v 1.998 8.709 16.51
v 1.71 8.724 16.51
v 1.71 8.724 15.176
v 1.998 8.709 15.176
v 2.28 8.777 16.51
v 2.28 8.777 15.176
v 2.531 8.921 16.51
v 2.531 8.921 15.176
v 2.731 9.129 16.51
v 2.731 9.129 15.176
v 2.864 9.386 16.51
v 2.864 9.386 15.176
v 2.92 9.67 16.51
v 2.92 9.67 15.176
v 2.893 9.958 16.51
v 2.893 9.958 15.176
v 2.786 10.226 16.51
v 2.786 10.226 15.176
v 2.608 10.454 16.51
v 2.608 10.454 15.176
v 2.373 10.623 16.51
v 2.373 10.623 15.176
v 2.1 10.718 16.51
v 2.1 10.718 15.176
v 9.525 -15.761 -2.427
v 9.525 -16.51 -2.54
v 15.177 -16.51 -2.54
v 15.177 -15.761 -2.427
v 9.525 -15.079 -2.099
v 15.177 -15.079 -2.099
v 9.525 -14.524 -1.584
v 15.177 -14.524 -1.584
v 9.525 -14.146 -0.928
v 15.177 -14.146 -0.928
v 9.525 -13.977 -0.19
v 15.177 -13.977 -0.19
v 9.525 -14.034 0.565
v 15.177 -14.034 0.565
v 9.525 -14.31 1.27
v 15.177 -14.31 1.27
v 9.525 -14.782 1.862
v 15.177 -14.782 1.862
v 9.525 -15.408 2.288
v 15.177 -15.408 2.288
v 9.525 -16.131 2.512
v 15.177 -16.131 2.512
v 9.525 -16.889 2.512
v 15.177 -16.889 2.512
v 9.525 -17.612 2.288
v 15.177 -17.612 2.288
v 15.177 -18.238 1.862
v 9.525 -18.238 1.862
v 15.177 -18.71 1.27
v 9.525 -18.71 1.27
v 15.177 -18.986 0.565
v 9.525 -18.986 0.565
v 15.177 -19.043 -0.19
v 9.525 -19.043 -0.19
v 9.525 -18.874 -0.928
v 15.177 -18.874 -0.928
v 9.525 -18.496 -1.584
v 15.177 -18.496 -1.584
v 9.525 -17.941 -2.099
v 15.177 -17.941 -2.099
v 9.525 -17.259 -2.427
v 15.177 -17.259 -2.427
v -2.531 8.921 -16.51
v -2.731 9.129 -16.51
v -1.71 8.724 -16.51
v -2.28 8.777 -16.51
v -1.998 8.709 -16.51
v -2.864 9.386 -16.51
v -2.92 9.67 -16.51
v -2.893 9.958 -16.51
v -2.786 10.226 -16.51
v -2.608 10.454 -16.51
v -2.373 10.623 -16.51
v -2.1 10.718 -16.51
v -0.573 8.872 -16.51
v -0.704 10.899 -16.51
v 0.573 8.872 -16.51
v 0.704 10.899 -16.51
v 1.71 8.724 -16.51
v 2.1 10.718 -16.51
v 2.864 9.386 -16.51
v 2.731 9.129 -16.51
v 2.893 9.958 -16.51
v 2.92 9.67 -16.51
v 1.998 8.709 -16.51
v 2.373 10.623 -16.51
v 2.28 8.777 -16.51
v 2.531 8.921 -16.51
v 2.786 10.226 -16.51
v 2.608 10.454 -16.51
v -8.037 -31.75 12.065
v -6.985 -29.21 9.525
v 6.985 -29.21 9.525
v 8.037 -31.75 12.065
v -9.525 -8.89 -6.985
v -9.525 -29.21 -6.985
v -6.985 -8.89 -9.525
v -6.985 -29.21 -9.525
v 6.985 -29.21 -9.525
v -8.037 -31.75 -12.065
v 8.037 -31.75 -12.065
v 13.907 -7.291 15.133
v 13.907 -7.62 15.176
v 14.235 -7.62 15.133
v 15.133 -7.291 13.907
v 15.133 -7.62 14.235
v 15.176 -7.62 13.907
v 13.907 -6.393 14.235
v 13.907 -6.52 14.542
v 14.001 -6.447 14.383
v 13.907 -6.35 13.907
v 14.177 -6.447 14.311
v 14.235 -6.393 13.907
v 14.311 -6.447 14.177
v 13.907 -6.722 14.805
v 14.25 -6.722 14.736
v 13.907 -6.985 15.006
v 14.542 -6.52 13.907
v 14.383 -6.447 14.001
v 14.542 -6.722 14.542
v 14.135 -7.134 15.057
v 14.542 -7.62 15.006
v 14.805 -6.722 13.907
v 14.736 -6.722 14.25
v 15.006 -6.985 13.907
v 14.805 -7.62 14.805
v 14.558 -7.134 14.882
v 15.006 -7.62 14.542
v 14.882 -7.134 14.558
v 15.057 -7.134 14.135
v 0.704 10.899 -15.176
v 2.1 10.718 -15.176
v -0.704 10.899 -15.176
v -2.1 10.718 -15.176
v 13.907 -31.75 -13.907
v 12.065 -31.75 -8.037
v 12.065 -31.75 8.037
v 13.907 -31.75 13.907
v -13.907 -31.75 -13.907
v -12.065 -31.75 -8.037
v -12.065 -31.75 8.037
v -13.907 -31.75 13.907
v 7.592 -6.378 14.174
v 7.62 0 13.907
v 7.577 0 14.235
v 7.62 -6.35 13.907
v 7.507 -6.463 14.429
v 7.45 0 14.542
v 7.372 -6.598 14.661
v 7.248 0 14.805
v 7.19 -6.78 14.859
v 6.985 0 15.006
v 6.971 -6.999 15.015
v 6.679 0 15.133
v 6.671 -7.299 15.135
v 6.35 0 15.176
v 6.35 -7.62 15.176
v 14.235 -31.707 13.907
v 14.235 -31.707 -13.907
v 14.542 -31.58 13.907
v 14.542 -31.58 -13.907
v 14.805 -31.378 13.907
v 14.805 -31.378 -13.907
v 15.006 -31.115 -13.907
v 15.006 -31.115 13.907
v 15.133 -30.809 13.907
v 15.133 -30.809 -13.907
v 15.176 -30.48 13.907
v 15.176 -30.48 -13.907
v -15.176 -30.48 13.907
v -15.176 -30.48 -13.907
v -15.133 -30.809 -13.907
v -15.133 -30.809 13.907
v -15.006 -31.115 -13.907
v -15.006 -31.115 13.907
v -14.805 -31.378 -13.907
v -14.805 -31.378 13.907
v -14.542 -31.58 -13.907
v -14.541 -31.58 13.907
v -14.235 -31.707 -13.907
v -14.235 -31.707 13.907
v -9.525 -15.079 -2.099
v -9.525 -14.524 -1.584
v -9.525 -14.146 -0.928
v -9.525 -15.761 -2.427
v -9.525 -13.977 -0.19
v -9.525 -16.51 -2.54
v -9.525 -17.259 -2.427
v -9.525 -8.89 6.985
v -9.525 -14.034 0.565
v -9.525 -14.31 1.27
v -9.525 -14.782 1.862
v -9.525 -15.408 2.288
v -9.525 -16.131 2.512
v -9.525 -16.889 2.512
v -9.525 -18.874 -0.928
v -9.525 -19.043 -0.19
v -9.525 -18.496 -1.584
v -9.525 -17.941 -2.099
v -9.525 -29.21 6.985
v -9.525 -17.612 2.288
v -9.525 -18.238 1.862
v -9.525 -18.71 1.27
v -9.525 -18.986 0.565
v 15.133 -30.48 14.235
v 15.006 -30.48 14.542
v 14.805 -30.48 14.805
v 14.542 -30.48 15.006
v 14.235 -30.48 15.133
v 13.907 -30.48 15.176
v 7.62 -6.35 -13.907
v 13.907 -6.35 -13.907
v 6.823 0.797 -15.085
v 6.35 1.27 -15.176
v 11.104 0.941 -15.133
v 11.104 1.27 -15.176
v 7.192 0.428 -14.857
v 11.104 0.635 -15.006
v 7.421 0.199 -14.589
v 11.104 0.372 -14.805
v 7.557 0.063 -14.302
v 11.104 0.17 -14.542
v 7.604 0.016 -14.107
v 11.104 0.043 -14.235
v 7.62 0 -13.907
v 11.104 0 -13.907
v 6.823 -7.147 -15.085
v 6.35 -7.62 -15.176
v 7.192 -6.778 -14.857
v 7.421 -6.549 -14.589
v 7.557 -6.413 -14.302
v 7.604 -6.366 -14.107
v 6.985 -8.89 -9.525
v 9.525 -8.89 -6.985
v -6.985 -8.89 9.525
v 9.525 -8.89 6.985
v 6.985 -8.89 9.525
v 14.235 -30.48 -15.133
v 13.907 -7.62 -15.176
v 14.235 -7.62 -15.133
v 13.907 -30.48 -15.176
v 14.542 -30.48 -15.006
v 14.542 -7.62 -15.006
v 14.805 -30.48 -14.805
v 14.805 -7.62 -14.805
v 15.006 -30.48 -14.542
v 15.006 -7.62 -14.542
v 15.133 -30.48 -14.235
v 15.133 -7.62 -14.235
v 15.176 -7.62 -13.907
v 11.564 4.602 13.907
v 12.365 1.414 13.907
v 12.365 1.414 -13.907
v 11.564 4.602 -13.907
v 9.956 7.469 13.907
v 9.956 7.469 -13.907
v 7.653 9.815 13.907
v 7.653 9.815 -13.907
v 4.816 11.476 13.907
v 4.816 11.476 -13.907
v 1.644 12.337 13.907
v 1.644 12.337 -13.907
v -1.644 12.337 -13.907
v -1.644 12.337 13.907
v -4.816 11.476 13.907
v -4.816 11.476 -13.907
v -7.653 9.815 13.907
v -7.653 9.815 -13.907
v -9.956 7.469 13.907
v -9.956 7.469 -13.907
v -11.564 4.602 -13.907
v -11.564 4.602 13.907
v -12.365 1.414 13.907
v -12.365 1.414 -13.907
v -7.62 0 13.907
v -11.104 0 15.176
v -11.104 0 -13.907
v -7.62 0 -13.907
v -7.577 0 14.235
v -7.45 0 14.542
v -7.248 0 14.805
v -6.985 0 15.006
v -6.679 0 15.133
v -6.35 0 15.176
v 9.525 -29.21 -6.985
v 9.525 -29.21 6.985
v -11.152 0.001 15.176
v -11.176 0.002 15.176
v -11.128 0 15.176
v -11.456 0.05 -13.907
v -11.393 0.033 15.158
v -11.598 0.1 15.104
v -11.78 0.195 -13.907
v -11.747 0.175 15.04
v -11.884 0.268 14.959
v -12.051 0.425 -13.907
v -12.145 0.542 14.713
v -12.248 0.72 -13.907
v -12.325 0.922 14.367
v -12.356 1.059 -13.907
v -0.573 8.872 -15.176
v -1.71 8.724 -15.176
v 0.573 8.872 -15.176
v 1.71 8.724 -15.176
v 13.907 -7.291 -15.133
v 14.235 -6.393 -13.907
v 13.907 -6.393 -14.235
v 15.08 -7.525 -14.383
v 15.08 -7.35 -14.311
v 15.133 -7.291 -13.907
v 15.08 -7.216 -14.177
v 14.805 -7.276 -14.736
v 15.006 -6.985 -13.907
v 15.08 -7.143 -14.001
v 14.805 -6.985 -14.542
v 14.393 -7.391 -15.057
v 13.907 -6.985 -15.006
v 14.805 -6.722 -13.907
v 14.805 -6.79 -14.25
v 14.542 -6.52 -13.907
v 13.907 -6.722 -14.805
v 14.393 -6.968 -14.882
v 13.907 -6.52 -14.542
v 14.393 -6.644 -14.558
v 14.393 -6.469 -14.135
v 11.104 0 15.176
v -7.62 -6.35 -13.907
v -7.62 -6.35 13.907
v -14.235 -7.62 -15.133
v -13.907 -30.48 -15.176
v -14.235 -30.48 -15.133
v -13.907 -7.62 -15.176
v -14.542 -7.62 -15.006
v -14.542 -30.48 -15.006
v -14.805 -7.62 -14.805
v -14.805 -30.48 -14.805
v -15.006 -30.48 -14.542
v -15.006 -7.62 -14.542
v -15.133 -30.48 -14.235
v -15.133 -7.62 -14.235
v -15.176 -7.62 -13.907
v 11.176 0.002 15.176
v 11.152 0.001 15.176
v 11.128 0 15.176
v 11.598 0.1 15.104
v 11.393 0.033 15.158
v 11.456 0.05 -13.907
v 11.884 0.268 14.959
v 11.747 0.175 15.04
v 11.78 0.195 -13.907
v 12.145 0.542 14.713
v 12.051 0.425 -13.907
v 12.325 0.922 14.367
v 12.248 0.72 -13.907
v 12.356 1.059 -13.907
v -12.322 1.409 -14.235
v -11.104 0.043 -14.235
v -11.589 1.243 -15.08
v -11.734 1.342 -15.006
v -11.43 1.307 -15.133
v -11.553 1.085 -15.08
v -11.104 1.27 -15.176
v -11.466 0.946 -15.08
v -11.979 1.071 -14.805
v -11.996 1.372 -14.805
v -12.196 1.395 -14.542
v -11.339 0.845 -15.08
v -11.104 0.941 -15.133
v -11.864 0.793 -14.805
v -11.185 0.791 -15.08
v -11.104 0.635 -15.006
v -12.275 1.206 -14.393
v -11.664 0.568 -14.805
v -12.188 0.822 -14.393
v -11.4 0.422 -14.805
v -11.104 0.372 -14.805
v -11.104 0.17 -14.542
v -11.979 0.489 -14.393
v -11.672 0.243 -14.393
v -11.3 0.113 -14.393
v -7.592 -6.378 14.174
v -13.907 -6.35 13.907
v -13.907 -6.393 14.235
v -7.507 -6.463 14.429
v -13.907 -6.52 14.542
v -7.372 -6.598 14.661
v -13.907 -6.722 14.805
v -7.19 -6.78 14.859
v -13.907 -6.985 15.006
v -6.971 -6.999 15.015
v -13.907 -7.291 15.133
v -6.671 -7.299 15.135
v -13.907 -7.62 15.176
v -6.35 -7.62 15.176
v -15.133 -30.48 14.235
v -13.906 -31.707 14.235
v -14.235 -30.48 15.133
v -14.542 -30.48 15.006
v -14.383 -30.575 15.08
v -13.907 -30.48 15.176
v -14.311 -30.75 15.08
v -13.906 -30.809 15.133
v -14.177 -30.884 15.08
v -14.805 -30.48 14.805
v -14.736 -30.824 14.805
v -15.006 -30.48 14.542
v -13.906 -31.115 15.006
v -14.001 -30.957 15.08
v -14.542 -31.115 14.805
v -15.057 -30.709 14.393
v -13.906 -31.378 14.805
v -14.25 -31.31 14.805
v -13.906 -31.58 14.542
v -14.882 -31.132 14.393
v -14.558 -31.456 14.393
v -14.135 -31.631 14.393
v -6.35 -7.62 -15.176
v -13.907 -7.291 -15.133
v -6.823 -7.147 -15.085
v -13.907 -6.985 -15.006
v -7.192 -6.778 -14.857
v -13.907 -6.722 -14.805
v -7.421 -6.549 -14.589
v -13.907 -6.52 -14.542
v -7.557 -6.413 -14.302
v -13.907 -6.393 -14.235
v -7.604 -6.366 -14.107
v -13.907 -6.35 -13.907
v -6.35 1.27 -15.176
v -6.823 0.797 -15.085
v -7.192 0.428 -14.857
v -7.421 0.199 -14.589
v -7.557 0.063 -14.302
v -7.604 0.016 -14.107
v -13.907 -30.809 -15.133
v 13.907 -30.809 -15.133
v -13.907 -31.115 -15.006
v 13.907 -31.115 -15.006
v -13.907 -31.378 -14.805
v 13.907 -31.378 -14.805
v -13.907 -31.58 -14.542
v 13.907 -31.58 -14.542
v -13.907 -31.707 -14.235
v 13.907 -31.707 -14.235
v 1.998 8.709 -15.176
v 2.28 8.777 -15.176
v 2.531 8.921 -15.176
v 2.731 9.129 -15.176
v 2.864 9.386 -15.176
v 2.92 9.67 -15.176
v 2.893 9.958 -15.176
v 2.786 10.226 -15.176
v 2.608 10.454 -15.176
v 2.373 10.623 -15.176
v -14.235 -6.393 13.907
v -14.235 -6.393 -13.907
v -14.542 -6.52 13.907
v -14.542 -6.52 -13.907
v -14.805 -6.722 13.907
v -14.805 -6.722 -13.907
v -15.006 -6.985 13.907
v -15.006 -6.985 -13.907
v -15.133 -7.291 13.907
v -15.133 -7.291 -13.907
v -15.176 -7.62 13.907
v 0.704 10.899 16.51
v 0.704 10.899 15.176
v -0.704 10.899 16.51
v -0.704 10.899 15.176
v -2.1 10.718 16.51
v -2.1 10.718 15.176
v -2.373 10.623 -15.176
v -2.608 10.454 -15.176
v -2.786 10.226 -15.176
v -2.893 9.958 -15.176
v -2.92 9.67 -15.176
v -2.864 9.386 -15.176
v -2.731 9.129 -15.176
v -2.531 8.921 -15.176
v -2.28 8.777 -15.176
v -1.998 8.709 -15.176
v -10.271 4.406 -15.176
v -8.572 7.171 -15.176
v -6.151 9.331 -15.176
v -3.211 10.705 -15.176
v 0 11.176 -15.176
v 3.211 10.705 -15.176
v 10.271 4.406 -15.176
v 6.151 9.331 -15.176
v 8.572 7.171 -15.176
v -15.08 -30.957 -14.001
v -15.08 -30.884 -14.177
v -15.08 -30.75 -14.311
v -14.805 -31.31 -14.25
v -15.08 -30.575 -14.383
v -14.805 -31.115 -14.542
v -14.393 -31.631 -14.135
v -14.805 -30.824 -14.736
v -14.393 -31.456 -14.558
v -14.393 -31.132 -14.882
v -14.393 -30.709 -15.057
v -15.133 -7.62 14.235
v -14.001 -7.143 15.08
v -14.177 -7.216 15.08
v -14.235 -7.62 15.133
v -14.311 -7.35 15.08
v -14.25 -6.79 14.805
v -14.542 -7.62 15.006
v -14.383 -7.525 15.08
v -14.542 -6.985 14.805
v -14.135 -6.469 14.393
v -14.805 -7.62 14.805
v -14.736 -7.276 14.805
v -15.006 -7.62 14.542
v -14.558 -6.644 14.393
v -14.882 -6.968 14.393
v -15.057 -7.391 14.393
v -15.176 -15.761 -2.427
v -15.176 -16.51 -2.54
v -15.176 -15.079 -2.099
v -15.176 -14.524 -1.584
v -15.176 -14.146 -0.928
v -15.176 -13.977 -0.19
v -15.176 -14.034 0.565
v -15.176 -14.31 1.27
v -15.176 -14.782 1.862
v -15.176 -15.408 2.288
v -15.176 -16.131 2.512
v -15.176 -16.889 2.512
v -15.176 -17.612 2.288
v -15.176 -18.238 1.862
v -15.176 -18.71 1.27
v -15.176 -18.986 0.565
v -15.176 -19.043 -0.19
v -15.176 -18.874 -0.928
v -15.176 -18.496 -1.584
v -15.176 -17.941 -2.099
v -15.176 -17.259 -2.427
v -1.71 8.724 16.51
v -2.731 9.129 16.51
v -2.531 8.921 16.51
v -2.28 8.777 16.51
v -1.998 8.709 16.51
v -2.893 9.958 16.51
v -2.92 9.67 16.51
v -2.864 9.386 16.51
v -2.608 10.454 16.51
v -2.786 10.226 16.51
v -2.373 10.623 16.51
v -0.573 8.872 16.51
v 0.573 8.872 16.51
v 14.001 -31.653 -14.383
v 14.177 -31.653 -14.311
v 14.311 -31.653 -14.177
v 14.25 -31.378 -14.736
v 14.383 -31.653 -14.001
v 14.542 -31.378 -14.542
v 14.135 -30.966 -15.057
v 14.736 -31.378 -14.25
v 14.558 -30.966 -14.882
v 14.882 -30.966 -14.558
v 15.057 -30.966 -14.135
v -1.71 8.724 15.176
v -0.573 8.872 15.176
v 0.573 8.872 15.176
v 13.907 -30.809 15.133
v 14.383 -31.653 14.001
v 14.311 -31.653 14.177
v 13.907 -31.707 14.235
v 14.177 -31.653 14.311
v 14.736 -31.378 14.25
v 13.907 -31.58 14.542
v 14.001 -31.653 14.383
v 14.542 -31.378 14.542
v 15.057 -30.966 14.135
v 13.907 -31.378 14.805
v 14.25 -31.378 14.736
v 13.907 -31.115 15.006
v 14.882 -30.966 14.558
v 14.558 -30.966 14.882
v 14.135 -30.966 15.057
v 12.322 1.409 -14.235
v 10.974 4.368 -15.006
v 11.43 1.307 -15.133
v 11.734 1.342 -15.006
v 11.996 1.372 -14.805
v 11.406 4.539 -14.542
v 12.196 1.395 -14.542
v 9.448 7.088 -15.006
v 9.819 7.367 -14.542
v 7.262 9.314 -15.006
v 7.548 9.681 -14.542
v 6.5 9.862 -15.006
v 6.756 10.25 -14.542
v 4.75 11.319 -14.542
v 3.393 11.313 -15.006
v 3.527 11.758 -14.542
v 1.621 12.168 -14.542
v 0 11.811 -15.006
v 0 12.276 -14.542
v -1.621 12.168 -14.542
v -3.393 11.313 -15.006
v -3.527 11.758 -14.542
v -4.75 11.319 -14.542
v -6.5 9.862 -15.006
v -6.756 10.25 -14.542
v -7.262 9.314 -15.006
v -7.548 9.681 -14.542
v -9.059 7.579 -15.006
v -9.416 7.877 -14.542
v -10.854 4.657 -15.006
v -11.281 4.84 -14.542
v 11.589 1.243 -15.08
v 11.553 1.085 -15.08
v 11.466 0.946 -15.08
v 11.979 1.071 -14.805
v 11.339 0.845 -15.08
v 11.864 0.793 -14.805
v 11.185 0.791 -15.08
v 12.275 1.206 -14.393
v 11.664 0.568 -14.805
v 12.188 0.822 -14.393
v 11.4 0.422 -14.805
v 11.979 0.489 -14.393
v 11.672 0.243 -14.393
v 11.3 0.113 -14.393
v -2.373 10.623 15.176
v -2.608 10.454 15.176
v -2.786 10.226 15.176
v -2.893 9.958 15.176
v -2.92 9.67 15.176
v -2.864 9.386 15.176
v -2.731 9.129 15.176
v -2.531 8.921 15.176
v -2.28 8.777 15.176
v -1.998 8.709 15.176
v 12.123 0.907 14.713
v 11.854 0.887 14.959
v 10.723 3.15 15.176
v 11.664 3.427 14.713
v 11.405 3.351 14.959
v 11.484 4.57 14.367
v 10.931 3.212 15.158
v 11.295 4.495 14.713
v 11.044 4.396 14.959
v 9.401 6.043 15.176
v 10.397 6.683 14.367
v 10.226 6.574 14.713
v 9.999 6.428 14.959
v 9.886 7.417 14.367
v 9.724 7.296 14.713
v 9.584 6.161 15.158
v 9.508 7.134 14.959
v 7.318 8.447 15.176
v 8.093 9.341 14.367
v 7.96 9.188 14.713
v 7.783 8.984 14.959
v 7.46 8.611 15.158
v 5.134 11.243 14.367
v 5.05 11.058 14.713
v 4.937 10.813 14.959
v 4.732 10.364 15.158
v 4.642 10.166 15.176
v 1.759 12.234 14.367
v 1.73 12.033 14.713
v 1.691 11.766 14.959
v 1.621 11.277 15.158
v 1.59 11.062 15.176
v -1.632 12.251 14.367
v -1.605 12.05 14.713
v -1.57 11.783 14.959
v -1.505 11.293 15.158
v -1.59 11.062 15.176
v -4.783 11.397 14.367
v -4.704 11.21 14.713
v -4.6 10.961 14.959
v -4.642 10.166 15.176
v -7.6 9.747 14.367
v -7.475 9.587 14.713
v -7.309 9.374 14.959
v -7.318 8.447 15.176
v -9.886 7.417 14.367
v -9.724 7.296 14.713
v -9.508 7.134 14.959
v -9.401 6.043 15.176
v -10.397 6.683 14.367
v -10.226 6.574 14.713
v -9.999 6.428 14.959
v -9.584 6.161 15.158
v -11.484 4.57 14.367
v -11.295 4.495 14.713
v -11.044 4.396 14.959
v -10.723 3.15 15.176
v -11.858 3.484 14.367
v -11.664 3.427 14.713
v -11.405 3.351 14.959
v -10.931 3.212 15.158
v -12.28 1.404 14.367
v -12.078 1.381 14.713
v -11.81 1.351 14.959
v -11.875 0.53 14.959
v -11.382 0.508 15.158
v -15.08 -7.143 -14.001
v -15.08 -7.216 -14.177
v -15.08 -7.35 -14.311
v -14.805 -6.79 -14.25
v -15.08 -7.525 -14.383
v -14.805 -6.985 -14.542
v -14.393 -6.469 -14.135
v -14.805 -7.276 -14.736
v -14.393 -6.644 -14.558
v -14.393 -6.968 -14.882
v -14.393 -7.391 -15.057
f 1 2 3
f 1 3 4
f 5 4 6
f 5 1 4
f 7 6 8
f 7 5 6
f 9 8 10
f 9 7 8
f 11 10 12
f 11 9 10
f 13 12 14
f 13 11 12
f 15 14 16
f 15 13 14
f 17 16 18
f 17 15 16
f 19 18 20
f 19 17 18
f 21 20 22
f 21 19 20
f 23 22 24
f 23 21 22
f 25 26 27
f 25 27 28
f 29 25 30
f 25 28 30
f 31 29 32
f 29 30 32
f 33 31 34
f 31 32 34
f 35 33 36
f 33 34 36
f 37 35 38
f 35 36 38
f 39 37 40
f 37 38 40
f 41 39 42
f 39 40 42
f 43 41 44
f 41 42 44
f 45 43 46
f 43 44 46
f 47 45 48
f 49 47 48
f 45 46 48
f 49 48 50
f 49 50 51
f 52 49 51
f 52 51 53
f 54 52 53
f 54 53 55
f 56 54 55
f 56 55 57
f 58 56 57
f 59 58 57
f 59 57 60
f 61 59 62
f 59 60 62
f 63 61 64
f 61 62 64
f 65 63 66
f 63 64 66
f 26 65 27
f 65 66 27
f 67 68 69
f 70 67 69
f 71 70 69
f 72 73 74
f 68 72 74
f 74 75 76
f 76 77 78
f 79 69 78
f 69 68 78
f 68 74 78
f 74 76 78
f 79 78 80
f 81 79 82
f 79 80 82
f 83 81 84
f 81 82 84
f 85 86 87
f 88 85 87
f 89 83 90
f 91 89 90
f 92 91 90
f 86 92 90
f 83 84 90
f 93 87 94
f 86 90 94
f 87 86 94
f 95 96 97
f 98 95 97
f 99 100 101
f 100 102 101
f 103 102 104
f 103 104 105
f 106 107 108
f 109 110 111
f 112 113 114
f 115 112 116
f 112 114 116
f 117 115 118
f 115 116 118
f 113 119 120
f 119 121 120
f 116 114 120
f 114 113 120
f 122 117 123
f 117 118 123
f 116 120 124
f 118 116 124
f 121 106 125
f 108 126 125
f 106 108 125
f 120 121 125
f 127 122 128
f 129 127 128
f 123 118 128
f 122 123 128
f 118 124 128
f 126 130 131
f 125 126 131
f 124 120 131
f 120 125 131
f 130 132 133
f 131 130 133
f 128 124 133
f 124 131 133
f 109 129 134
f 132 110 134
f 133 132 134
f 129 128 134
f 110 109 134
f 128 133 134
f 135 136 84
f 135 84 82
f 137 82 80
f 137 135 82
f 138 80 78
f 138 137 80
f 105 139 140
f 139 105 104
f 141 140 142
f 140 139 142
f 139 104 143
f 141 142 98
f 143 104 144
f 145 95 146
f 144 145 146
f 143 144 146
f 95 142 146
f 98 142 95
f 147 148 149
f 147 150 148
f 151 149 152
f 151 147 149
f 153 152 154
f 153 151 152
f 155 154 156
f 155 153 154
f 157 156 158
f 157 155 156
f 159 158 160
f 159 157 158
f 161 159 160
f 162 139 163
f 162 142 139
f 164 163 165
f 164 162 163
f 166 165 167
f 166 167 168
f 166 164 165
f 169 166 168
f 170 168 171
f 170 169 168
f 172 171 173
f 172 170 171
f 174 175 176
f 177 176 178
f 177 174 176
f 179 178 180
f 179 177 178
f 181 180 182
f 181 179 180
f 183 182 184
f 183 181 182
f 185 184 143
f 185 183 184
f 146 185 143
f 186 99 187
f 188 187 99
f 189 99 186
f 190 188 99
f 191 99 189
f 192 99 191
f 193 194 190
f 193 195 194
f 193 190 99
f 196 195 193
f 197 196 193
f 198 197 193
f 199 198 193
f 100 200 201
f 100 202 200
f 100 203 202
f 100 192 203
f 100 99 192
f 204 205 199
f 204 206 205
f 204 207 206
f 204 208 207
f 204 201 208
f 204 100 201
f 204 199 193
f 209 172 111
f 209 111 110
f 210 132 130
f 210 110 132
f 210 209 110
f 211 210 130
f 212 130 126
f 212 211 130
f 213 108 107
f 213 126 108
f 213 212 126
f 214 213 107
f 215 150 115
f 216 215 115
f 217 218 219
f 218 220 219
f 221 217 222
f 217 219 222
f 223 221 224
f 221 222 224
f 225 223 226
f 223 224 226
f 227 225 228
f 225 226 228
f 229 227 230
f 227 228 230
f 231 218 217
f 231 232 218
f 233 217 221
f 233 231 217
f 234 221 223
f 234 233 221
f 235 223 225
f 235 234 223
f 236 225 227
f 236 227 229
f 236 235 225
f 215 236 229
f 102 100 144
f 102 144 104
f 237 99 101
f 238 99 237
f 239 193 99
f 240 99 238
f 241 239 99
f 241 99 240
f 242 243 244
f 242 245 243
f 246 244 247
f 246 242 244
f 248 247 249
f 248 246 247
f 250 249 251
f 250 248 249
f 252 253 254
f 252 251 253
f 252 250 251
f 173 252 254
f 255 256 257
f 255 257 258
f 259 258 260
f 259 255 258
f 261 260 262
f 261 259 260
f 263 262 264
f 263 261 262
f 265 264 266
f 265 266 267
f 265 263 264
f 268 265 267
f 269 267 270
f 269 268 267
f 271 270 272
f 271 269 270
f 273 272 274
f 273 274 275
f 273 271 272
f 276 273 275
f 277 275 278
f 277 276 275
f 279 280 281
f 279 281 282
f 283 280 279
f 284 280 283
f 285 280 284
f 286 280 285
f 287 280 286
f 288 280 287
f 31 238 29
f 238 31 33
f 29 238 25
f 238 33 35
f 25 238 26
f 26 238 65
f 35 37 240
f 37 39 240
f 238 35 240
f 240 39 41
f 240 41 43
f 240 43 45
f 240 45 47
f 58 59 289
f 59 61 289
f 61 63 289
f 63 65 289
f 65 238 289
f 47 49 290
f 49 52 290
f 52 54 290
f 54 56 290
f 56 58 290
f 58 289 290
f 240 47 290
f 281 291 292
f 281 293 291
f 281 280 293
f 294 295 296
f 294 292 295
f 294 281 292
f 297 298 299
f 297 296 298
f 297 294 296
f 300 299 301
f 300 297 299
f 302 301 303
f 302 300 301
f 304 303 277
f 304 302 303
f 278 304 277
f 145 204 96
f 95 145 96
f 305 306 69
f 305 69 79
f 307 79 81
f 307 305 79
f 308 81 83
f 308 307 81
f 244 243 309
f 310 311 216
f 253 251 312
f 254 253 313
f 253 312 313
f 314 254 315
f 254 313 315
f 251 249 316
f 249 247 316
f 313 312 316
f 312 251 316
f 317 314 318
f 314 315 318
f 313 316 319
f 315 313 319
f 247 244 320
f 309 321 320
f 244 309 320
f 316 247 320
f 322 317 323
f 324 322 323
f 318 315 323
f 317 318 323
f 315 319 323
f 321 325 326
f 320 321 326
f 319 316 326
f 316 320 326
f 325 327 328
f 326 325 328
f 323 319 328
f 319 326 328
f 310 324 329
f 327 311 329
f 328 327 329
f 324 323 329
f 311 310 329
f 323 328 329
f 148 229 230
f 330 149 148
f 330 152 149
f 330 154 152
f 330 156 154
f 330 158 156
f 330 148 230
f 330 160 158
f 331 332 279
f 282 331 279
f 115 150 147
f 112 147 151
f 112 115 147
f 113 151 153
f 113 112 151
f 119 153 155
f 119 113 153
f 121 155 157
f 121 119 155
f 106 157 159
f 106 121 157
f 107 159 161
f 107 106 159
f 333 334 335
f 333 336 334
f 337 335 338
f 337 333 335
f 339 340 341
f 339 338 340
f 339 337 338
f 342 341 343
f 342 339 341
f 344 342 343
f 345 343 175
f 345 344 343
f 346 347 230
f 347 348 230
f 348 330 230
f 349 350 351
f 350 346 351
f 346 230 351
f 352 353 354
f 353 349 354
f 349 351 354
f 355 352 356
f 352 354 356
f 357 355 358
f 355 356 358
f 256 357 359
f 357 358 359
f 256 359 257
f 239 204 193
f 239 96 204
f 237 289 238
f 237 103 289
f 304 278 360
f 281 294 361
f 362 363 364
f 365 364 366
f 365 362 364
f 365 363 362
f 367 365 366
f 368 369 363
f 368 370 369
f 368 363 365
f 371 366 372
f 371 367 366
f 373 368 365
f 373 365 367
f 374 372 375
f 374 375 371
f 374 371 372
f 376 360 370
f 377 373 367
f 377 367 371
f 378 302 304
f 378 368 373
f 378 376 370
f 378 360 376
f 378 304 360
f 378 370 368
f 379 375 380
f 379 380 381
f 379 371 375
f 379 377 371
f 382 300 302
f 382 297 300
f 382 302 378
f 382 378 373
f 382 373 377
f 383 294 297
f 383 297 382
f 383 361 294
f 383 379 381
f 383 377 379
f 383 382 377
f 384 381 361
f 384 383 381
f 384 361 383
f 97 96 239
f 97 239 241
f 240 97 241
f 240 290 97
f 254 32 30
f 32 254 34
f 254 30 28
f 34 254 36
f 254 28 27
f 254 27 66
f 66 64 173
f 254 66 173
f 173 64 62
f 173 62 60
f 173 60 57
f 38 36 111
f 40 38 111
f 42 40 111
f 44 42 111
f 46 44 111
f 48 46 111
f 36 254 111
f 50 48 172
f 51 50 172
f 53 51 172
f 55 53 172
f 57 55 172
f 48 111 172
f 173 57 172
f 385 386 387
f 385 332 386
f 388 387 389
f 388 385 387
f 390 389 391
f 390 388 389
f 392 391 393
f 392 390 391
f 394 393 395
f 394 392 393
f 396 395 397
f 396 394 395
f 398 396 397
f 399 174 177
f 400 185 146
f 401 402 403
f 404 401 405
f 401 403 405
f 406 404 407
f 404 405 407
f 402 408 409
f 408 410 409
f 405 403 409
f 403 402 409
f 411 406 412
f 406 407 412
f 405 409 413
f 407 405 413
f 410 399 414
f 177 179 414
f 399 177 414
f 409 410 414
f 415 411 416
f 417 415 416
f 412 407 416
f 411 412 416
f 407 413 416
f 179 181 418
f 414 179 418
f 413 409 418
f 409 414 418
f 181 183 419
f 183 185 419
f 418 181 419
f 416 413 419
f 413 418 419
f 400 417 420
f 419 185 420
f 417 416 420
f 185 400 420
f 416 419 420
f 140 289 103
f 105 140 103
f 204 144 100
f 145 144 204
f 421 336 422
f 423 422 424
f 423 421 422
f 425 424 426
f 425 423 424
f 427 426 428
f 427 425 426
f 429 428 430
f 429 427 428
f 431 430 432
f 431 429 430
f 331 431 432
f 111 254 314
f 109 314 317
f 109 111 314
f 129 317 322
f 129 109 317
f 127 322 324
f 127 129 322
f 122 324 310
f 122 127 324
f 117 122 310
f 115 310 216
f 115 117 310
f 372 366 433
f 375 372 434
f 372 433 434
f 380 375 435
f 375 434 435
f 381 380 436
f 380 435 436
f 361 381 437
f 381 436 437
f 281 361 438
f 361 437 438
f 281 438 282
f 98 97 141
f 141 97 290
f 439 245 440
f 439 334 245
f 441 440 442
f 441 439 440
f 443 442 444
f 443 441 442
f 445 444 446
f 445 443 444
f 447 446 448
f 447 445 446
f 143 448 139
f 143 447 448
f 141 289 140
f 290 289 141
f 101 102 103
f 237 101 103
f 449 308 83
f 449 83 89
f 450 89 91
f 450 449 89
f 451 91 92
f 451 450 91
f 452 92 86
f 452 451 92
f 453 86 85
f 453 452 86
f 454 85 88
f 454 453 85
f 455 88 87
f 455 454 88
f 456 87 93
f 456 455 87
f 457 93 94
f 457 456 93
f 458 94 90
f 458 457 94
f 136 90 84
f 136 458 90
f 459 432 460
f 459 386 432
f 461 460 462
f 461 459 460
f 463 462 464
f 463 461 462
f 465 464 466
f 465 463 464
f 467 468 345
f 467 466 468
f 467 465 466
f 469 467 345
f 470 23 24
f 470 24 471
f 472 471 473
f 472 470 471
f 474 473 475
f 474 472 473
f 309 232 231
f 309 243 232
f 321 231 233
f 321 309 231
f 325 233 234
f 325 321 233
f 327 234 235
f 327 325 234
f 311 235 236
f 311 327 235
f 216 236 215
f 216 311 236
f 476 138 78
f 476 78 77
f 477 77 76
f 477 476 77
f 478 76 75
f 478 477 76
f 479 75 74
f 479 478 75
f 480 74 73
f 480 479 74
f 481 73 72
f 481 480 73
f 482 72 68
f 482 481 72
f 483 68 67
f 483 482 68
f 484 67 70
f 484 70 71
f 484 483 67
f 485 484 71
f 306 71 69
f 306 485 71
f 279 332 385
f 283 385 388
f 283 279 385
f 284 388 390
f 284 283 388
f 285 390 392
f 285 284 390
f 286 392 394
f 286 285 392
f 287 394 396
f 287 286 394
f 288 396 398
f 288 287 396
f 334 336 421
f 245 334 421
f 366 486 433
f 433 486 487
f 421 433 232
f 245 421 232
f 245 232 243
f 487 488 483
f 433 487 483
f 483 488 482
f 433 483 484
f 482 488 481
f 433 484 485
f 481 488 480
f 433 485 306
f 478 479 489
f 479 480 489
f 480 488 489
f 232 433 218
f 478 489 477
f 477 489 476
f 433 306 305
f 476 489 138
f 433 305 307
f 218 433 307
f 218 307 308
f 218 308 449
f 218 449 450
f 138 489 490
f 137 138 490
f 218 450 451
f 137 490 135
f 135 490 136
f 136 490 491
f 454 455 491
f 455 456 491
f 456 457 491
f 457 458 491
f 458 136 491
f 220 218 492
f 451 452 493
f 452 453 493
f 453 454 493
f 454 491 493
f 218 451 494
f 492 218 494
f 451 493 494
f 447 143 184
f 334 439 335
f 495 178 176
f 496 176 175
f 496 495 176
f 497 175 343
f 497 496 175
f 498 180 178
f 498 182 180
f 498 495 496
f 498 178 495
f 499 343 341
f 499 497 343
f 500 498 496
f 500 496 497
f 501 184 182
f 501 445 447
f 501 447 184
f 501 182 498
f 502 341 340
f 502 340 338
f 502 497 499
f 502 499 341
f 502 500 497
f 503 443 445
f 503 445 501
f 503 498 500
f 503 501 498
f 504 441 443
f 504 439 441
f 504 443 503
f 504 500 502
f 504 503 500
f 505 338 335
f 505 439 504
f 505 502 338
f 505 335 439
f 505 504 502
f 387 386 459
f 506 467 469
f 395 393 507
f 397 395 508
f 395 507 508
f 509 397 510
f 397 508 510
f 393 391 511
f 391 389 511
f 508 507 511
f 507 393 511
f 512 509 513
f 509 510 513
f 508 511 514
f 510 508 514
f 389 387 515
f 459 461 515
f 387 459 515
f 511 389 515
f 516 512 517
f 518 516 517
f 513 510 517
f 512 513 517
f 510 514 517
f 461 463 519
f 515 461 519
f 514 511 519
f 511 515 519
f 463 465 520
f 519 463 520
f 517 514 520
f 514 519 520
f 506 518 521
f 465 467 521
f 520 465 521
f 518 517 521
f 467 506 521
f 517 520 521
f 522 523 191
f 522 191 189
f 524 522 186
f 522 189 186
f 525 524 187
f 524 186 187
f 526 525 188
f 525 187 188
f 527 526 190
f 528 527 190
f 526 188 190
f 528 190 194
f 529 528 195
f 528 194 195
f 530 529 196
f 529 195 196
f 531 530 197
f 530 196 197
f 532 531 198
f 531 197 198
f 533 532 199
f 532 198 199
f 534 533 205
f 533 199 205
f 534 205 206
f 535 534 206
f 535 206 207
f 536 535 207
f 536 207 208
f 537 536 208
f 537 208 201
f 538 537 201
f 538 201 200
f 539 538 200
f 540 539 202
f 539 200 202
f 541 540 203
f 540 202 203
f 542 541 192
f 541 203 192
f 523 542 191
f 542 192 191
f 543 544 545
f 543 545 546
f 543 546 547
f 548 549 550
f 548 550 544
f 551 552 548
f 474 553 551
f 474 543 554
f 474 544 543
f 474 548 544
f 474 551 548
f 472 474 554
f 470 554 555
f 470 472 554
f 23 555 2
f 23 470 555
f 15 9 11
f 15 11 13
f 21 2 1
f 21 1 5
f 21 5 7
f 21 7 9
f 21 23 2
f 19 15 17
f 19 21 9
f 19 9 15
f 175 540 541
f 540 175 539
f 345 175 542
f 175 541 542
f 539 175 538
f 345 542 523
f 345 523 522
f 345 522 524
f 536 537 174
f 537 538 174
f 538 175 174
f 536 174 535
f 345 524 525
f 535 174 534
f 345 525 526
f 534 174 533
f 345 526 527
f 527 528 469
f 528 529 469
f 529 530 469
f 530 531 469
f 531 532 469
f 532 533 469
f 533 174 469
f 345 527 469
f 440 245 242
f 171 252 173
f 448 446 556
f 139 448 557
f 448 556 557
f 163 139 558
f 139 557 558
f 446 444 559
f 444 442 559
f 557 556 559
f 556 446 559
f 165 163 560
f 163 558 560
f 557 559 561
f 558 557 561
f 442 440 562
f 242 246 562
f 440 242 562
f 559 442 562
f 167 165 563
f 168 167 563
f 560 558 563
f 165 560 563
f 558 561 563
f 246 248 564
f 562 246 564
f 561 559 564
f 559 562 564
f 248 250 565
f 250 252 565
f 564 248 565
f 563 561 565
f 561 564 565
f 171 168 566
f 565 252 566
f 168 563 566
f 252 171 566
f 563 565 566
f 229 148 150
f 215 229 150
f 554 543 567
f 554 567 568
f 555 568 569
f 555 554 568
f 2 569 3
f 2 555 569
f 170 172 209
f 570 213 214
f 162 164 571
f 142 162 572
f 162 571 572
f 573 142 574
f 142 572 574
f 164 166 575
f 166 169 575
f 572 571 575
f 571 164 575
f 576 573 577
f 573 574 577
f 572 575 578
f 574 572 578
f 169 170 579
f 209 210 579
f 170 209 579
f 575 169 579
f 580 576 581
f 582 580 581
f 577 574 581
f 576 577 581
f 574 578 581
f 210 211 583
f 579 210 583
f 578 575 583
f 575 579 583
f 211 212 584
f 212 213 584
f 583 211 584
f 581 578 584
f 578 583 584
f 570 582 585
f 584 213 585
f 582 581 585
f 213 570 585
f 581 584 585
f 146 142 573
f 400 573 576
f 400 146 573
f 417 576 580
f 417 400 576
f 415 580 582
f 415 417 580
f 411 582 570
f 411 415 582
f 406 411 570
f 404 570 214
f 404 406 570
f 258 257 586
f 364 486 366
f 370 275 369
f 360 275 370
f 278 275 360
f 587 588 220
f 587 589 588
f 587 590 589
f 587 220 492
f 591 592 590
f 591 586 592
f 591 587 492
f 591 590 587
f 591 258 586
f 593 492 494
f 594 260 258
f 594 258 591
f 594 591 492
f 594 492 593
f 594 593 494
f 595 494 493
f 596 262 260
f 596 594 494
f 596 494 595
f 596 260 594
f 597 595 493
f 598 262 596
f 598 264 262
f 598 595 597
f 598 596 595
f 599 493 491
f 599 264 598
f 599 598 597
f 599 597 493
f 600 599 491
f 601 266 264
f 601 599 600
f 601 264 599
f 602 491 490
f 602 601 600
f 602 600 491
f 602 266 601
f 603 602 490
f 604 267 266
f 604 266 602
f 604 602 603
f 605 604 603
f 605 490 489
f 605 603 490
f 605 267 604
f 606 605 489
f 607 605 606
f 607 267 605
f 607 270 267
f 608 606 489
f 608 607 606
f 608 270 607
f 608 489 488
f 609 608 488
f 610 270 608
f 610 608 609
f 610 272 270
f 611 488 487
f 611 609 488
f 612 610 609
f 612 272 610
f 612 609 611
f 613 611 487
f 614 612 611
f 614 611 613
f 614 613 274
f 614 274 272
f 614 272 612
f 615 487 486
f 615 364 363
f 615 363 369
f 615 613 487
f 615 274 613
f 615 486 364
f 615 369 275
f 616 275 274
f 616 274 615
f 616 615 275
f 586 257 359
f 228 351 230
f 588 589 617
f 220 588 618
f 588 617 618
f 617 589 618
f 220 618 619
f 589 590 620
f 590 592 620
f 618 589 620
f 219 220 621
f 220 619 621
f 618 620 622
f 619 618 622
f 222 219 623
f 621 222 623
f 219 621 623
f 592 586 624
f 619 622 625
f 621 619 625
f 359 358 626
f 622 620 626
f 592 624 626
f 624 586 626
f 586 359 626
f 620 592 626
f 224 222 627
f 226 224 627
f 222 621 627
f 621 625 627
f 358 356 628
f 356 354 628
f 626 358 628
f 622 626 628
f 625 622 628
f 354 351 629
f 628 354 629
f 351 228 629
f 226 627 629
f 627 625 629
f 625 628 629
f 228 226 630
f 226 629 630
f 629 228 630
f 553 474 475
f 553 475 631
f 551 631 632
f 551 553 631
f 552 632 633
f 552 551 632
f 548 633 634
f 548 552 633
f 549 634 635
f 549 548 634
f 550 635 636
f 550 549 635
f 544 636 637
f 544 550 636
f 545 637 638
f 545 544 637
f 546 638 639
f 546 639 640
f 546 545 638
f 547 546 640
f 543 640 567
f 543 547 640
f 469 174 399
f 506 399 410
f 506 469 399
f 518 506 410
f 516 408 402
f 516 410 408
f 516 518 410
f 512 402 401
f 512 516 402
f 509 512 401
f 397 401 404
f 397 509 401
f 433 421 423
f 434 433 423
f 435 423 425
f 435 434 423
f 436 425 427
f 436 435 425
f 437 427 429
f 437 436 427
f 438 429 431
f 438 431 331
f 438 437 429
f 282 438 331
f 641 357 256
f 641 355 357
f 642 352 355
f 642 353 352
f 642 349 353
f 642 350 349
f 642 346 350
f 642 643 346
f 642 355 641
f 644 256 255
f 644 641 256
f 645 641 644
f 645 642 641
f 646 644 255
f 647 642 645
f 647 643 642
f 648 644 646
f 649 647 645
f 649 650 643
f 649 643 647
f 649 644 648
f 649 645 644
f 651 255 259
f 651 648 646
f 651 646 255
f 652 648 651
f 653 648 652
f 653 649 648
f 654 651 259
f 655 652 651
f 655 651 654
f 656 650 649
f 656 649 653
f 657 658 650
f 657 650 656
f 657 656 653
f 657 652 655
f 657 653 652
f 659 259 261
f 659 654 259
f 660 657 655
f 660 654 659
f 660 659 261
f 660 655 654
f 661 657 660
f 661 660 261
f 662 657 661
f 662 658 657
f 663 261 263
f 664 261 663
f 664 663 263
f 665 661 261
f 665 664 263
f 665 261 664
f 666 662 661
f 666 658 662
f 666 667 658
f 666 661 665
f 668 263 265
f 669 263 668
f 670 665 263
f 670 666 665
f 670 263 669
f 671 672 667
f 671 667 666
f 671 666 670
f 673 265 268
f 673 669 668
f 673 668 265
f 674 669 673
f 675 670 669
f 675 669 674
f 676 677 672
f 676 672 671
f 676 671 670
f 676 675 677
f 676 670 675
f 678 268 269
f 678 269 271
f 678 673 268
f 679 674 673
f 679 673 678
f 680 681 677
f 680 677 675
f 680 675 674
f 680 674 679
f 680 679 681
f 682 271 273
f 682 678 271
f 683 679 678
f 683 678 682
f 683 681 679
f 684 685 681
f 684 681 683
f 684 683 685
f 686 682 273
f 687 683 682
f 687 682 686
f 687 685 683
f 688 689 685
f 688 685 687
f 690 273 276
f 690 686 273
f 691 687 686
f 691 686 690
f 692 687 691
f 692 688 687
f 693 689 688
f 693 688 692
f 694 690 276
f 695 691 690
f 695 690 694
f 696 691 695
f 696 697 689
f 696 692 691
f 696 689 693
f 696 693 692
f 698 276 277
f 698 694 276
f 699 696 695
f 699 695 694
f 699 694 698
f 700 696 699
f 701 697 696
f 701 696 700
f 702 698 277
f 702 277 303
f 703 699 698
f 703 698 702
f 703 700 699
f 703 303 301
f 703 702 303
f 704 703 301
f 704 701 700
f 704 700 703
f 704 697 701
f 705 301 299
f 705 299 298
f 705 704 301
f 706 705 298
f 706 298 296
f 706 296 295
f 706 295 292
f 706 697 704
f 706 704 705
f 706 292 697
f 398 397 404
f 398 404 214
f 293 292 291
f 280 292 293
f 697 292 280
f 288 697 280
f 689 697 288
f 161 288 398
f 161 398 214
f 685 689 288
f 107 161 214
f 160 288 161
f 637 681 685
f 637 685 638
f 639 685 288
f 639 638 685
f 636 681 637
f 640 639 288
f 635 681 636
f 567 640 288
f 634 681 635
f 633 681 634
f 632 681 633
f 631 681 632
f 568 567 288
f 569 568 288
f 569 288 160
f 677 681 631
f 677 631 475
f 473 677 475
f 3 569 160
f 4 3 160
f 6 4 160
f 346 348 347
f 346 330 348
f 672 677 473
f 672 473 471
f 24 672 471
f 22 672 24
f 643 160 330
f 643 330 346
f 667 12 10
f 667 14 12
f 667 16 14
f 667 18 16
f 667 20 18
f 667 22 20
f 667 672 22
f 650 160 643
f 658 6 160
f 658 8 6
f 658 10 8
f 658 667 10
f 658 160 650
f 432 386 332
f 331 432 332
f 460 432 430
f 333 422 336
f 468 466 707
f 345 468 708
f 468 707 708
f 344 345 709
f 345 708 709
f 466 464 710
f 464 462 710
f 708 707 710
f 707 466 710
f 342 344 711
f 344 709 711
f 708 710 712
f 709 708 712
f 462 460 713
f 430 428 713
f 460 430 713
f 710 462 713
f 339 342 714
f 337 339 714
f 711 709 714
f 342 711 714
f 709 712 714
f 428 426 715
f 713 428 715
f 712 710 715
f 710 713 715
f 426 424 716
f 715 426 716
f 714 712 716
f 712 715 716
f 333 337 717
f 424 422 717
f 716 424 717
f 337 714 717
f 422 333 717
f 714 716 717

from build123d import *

# Parameters (mm, degrees)
MAIN_BODY_EXTRUDE_DEPTH   = 15.1765
SLOT_EXTRUDE_DEPTH        = 16.51
SKETCH2_W                 = 19.05
SKETCH2_H                 = 19.05
FOOT_CONNECTION_CUT_DEPTH = 22.86
PINHOLE_CUT_DEPTH         = 25.4
FILLET1_R                 = 1.27
CHAMFER2_SIZE             = 2.54
CHAMFER1_SIZE             = 2.54


with BuildPart() as part:
    # Sketch1 → Main Body Extrude (new, symmetric)
    with BuildSketch(Plane.XY):
        with BuildLine():
            ThreePointArc((12.446, 0), (0, 12.446), (-12.446, 0))
            Line((-12.446, 0), (-7.62, 0))
            Line((-7.62, 0), (-7.62, -6.35))
            Line((-7.62, -6.35), (-15.1765, -6.35))
            Line((-15.1765, -6.35), (-15.1765, -31.75))
            Line((-15.1765, -31.75), (15.1765, -31.75))
            Line((15.1765, -31.75), (15.1765, -6.35))
            Line((15.1765, -6.35), (7.62, -6.35))
            Line((7.62, -6.35), (7.62, 0))
            Line((7.62, 0), (12.446, 0))
        make_face()
        with BuildLine():
            ThreePointArc((2.100384615, 10.71813736), (2.902036033, 9.525716711), (1.709615385, 8.724065293))
            ThreePointArc((1.709615385, 8.724065293), (0, 8.89), (-1.709615385, 8.724065293))
            ThreePointArc((-1.709615385, 8.724065293), (-2.902036033, 9.525716711), (-2.100384615, 10.71813736))
            ThreePointArc((-2.100384615, 10.71813736), (0, 10.922), (2.100384615, 10.71813736))
        make_face(mode=Mode.SUBTRACT)
    extrude(amount=MAIN_BODY_EXTRUDE_DEPTH, both=True)

    # Sketch1<4> → Slot Extrude (add, symmetric)
    with BuildSketch(Plane.XY):
        with BuildLine():
            ThreePointArc((-2.100384615, 10.71813736), (-2.902036033, 9.525716711), (-1.709615385, 8.724065293))
            ThreePointArc((-1.709615385, 8.724065293), (0, 8.89), (1.709615385, 8.724065293))
            ThreePointArc((1.709615385, 8.724065293), (2.902036033, 9.525716711), (2.100384615, 10.71813736))
            ThreePointArc((2.100384615, 10.71813736), (0, 10.922), (-2.100384615, 10.71813736))
        make_face()
    extrude(amount=SLOT_EXTRUDE_DEPTH, both=True)

    # Sketch2 → Foot Connection Cut (cut)
    with BuildSketch(Plane.XZ.offset(31.75)):
        Rectangle(SKETCH2_W, SKETCH2_H)
    extrude(amount=-FOOT_CONNECTION_CUT_DEPTH, mode=Mode.SUBTRACT)

    # Sketch4 → Pinhole Cut (cut, symmetric)
    with BuildSketch(Plane(origin=(-9.525, 0, 0), x_dir=(0, 0, -1), z_dir=(1, 0, 0))):
        with BuildLine():
            ThreePointArc((2.54, -16.51), (1.796051224, -14.713948776), (0, -13.97))
            ThreePointArc((0, -13.97), (-1.796051224, -18.306051224), (2.54, -16.51))
        make_face()
    extrude(amount=PINHOLE_CUT_DEPTH, both=True, mode=Mode.SUBTRACT)

    # Fillet1
    fillet1_edges = [part.edges().sort_by_distance(p)[0] for p in [
        (11.39825, -6.35, 15.1765),
        (12.446, 0, 0),
        (15.1765, -6.35, 0),
        (7.62, -3.175, 15.1765),
        (-11.39825, -6.35, 15.1765),
        (-15.1765, -6.35, 0),
        (-7.62, -3.175, 15.1765),
        (-12.446, 0, 0),
        (0, 12.446, 15.1765),
        (11.39825, -6.35, -15.1765),
        (7.62, -3.175, -15.1765),
        (10.033, 0, -15.1765),
        (-10.033, 0, -15.1765),
        (-7.62, -3.175, -15.1765),
        (-11.39825, -6.35, -15.1765),
        (0, 12.446, -15.1765),
        (15.1765, -31.75, 0),
        (-15.1765, -31.75, 0),
        (0, -31.75, 15.1765),
        (0, -31.75, -15.1765),
        (-15.1765, -19.05, -15.1765),
        (-15.1765, -19.05, 15.1765),
        (15.1765, -19.05, 15.1765),
        (15.1765, -19.05, -15.1765),
    ]]
    fillet(fillet1_edges, radius=FILLET1_R)

    # Chamfer2
    chamfer2_edges = [part.edges().sort_by_distance(p)[0] for p in [
        (-9.525, -20.32, -9.525),
        (-9.525, -20.32, 9.525),
        (9.525, -20.32, -9.525),
        (9.525, -20.32, 9.525),
    ]]
    chamfer(chamfer2_edges, length=CHAMFER2_SIZE)

    # Chamfer1
    chamfer1_edges = [part.edges().sort_by_distance(p)[0] for p in [
        (9.525, -31.75, 0),
        (0, -31.75, -9.525),
        (0, -31.75, 9.525),
        (-9.525, -31.75, 0),
        (-8.255, -31.75, 8.255),
        (8.255, -31.75, 8.255),
        (8.255, -31.75, -8.255),
        (-8.255, -31.75, -8.255),
    ]]
    chamfer(chamfer1_edges, length=CHAMFER1_SIZE)


solid = part.part
